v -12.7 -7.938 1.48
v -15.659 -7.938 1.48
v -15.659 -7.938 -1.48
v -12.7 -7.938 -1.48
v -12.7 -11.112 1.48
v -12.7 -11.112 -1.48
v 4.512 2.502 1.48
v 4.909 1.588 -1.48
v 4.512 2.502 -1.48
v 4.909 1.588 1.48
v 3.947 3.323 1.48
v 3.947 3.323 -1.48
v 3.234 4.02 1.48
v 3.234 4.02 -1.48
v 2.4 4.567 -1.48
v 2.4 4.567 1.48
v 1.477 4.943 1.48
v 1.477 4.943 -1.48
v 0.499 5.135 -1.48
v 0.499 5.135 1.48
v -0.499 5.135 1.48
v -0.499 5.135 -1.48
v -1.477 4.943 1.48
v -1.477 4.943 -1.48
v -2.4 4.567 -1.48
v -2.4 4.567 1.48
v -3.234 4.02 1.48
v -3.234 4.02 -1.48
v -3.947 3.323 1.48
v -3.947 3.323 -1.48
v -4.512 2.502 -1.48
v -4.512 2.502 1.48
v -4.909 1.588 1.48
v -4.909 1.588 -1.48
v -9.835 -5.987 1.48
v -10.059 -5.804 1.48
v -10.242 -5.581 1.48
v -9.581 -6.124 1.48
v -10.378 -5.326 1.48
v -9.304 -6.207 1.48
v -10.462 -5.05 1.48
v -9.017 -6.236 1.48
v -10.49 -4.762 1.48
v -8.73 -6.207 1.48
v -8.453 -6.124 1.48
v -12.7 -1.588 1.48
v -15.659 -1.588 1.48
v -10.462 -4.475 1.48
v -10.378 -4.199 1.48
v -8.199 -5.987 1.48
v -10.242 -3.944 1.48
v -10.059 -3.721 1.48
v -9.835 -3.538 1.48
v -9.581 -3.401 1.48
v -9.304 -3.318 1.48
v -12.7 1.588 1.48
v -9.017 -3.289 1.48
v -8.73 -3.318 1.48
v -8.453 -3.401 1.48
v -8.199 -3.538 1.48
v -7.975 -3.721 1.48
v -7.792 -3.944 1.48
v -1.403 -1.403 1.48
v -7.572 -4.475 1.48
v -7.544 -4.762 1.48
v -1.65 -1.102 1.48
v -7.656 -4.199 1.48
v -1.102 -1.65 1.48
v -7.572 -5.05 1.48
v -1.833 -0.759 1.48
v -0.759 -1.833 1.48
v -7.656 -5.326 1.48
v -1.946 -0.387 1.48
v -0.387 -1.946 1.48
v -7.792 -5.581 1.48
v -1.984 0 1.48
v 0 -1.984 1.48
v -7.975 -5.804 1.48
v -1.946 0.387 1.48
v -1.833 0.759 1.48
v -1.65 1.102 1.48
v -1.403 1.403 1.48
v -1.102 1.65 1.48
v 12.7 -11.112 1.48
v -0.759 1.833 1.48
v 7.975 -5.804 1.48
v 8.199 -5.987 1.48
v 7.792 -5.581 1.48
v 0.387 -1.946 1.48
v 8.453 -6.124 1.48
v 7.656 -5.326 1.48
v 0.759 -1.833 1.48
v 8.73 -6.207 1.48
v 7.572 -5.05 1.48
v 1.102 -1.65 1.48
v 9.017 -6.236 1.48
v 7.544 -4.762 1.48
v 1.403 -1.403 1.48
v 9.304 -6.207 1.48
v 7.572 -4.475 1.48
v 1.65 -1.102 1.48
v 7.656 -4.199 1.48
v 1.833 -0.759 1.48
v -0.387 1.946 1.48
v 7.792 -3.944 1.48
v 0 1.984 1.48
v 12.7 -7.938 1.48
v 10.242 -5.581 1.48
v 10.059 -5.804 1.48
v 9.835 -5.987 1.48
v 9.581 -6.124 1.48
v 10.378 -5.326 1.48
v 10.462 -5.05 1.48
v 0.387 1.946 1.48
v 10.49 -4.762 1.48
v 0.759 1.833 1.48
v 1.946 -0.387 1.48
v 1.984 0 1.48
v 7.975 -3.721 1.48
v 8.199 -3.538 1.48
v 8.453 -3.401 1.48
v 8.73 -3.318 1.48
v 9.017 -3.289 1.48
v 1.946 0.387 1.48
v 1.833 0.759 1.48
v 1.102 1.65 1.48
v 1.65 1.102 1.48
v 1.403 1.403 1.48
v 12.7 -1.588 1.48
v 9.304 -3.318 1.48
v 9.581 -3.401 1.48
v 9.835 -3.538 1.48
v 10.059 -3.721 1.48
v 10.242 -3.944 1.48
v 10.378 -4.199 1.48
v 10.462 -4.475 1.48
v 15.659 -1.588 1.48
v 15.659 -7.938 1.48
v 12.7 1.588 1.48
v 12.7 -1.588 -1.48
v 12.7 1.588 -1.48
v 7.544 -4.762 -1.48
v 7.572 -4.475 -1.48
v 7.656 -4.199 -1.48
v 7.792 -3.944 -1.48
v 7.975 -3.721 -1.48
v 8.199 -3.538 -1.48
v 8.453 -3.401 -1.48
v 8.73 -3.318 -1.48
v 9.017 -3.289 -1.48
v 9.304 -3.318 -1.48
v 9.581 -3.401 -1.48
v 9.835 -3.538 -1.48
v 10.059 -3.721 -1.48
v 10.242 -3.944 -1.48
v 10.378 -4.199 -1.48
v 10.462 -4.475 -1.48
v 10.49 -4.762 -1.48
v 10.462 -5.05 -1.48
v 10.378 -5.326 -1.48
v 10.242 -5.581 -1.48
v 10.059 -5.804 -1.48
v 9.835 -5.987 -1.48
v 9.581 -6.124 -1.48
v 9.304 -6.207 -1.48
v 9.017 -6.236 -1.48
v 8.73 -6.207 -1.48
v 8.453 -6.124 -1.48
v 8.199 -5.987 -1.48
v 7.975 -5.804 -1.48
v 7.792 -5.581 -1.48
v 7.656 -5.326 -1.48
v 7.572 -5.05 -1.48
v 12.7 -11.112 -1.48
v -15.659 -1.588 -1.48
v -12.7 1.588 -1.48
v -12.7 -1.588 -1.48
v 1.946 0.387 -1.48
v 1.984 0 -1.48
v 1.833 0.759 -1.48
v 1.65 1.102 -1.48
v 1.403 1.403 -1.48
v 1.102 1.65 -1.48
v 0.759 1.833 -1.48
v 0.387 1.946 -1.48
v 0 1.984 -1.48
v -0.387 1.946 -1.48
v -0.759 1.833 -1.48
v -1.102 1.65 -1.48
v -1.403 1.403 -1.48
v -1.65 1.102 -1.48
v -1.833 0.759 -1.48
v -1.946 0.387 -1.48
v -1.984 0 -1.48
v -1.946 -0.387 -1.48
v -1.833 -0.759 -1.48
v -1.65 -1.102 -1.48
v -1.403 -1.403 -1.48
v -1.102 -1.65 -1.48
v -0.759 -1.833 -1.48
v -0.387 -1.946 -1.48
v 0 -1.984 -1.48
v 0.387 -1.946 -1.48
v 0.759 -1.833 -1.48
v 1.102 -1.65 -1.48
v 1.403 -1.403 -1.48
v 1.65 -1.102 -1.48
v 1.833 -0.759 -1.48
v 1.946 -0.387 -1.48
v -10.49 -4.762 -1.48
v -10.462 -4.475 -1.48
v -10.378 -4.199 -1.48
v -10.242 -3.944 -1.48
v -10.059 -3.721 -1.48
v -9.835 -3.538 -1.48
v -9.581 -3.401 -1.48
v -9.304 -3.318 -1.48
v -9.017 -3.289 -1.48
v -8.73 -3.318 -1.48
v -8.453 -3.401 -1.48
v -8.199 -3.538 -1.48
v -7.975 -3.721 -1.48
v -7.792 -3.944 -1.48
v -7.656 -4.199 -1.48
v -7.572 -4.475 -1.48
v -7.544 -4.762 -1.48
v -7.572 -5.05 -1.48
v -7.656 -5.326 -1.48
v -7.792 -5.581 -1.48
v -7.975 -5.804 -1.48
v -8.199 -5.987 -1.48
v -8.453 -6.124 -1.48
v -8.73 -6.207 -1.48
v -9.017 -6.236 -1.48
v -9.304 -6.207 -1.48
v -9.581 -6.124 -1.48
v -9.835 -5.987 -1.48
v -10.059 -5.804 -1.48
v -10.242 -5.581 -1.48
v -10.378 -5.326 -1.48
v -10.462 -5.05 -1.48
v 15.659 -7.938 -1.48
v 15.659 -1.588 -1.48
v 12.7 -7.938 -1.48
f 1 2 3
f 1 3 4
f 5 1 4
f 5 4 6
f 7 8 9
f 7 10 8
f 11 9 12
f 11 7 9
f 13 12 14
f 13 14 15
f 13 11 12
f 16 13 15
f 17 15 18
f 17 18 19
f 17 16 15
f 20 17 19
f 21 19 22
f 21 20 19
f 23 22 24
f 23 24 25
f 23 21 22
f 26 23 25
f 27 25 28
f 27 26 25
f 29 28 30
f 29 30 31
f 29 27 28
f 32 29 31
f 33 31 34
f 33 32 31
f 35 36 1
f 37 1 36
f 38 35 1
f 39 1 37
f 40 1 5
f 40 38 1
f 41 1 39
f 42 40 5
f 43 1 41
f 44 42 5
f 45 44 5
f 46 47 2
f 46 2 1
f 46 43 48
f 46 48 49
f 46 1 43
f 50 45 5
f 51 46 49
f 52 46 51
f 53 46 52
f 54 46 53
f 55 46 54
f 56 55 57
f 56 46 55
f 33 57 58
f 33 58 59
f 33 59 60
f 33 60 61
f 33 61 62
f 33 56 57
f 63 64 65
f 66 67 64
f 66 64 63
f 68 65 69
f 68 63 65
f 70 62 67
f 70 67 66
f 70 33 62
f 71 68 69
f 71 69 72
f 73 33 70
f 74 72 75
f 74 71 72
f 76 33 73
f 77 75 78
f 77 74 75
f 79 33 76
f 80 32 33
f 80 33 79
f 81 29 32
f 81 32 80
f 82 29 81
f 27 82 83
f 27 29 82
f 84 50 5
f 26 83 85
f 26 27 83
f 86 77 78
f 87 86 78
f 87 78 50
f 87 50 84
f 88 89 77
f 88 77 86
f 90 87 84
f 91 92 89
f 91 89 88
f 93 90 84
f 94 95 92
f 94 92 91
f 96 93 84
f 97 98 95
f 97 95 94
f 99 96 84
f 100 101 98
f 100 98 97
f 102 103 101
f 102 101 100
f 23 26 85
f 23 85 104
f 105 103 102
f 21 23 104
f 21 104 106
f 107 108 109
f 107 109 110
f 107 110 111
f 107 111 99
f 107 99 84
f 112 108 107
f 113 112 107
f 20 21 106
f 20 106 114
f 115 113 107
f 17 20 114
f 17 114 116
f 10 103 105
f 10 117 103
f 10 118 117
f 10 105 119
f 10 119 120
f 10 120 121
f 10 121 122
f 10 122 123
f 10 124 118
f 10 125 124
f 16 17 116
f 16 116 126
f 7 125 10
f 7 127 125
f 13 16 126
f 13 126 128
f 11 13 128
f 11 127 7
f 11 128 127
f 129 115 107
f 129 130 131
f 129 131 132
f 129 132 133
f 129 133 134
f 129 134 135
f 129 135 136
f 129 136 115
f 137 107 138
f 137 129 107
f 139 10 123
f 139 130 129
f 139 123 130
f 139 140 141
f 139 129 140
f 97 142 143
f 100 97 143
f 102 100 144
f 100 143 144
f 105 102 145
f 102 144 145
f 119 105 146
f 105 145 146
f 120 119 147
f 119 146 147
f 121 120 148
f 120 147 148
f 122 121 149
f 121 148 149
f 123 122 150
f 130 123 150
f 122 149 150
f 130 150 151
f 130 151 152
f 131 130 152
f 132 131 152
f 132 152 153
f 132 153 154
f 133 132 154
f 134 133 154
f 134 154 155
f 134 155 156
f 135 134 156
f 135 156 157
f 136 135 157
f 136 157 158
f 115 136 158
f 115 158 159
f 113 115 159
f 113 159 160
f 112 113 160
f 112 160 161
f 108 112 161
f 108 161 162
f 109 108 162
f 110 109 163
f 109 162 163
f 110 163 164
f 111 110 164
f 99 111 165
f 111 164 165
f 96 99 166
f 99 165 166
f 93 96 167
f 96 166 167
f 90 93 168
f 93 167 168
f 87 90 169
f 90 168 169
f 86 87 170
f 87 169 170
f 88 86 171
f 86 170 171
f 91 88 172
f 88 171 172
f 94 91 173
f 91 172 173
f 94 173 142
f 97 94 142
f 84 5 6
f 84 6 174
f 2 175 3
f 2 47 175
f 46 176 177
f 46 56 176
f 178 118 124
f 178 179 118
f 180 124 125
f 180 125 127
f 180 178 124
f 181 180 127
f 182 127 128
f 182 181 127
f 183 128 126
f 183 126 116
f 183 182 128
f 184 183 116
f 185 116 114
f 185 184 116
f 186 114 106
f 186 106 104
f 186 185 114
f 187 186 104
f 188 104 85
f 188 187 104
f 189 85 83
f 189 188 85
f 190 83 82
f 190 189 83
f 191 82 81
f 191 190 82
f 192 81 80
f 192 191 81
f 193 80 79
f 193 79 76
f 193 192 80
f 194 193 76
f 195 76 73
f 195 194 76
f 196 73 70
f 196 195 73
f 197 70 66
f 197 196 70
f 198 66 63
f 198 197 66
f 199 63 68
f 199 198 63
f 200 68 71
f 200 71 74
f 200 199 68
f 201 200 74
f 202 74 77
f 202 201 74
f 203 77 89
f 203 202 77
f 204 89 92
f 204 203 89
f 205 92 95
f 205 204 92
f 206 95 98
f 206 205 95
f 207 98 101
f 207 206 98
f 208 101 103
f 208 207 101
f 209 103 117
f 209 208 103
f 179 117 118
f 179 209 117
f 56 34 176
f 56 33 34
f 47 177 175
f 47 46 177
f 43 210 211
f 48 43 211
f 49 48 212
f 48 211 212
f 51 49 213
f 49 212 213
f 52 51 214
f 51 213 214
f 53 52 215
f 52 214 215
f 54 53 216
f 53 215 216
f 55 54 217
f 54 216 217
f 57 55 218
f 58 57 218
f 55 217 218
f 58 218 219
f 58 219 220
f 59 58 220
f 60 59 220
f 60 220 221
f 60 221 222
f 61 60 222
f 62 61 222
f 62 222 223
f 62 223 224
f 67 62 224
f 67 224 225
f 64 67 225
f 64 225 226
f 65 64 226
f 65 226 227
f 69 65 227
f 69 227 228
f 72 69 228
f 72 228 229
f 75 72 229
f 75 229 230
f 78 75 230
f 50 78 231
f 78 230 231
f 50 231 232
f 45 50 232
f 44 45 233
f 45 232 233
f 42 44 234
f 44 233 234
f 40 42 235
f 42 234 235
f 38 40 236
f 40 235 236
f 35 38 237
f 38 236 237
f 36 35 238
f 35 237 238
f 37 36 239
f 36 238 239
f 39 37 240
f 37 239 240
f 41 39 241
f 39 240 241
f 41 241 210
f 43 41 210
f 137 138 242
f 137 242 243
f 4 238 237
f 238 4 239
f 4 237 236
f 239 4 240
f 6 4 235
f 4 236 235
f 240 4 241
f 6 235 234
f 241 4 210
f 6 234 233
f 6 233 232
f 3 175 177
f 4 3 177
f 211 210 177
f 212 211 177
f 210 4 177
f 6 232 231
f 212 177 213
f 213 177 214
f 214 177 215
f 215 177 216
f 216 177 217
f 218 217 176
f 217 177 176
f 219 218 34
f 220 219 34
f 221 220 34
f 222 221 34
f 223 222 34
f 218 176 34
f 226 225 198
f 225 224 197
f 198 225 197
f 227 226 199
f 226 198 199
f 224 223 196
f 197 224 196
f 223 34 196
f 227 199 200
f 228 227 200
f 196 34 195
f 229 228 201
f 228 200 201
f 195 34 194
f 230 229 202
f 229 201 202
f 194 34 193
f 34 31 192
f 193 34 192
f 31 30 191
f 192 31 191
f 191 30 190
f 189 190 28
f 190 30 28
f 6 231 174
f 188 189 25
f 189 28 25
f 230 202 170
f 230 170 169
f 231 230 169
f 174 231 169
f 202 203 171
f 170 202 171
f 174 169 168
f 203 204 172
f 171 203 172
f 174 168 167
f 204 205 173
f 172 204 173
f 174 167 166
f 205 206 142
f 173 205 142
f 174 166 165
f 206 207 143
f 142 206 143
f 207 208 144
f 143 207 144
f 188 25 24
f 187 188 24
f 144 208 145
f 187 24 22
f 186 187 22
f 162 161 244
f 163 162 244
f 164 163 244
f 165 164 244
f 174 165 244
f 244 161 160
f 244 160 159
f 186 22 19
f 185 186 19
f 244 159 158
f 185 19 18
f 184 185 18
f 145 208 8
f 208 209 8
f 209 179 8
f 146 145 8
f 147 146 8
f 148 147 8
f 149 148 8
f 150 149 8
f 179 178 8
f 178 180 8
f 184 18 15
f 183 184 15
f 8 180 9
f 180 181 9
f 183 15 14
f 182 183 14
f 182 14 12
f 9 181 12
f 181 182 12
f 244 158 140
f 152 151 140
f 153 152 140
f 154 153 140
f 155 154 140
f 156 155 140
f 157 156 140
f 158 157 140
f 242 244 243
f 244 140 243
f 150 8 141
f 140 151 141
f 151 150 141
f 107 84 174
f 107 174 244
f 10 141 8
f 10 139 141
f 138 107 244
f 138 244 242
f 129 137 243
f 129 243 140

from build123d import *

# Parameters (mm, degrees)
SKETCH1_R                 = 1.984375
BOSS_EXTRUDE1_DEPTH       = 1.47955
F_4_CLEARANCE_HOLE1_D     = 2.9464
F_4_CLEARANCE_HOLE1_DEPTH = 3.302
F_4_CLEARANCE_HOLE1_TIP   = 0.885187864


with BuildPart() as part:
    # Sketch1 → Boss-Extrude1 (new body, symmetric)
    with BuildSketch(Plane.XY):
        with BuildLine():
            Line((-15.6591, -1.5875), (-15.6591, -7.9375))
            Line((-15.6591, -7.9375), (-12.7, -7.9375))
            Line((-12.7, -7.9375), (-12.7, -11.1125))
            Line((-12.7, -11.1125), (12.7, -11.1125))
            Line((12.7, -11.1125), (12.7, -7.9375))
            Line((12.7, -7.9375), (15.6591, -7.9375))
            Line((15.6591, -7.9375), (15.6591, -1.5875))
            Line((15.6591, -1.5875), (12.7, -1.5875))
            Line((12.7, -1.5875), (12.7, 1.5875))
            Line((12.7, 1.5875), (4.909072636, 1.5875))
            ThreePointArc((4.909072636, 1.5875), (0, 5.159375), (-4.909072636, 1.5875))
            Line((-4.909072636, 1.5875), (-12.7, 1.5875))
            Line((-12.7, 1.5875), (-12.7, -1.5875))
            Line((-12.7, -1.5875), (-15.6591, -1.5875))
        make_face()
        Circle(SKETCH1_R, mode=Mode.SUBTRACT)
    extrude(amount=BOSS_EXTRUDE1_DEPTH, both=True)

    # #4 Clearance Hole1
    with Locations(Plane(origin=(0.047806488, 1.573653324, 1.47955), x_dir=(1, 0, 0), z_dir=(0, 0, 1))):
        with Locations((-9.064806488, -6.336153324), (8.969193512, -6.336153324)):
            Hole(F_4_CLEARANCE_HOLE1_D / 2, depth=F_4_CLEARANCE_HOLE1_DEPTH)
            with Locations((0, 0, -(F_4_CLEARANCE_HOLE1_DEPTH + F_4_CLEARANCE_HOLE1_TIP / 2))):  # 118° drill point
                Cone(0, F_4_CLEARANCE_HOLE1_D / 2, F_4_CLEARANCE_HOLE1_TIP, mode=Mode.SUBTRACT)


solid = part.part
